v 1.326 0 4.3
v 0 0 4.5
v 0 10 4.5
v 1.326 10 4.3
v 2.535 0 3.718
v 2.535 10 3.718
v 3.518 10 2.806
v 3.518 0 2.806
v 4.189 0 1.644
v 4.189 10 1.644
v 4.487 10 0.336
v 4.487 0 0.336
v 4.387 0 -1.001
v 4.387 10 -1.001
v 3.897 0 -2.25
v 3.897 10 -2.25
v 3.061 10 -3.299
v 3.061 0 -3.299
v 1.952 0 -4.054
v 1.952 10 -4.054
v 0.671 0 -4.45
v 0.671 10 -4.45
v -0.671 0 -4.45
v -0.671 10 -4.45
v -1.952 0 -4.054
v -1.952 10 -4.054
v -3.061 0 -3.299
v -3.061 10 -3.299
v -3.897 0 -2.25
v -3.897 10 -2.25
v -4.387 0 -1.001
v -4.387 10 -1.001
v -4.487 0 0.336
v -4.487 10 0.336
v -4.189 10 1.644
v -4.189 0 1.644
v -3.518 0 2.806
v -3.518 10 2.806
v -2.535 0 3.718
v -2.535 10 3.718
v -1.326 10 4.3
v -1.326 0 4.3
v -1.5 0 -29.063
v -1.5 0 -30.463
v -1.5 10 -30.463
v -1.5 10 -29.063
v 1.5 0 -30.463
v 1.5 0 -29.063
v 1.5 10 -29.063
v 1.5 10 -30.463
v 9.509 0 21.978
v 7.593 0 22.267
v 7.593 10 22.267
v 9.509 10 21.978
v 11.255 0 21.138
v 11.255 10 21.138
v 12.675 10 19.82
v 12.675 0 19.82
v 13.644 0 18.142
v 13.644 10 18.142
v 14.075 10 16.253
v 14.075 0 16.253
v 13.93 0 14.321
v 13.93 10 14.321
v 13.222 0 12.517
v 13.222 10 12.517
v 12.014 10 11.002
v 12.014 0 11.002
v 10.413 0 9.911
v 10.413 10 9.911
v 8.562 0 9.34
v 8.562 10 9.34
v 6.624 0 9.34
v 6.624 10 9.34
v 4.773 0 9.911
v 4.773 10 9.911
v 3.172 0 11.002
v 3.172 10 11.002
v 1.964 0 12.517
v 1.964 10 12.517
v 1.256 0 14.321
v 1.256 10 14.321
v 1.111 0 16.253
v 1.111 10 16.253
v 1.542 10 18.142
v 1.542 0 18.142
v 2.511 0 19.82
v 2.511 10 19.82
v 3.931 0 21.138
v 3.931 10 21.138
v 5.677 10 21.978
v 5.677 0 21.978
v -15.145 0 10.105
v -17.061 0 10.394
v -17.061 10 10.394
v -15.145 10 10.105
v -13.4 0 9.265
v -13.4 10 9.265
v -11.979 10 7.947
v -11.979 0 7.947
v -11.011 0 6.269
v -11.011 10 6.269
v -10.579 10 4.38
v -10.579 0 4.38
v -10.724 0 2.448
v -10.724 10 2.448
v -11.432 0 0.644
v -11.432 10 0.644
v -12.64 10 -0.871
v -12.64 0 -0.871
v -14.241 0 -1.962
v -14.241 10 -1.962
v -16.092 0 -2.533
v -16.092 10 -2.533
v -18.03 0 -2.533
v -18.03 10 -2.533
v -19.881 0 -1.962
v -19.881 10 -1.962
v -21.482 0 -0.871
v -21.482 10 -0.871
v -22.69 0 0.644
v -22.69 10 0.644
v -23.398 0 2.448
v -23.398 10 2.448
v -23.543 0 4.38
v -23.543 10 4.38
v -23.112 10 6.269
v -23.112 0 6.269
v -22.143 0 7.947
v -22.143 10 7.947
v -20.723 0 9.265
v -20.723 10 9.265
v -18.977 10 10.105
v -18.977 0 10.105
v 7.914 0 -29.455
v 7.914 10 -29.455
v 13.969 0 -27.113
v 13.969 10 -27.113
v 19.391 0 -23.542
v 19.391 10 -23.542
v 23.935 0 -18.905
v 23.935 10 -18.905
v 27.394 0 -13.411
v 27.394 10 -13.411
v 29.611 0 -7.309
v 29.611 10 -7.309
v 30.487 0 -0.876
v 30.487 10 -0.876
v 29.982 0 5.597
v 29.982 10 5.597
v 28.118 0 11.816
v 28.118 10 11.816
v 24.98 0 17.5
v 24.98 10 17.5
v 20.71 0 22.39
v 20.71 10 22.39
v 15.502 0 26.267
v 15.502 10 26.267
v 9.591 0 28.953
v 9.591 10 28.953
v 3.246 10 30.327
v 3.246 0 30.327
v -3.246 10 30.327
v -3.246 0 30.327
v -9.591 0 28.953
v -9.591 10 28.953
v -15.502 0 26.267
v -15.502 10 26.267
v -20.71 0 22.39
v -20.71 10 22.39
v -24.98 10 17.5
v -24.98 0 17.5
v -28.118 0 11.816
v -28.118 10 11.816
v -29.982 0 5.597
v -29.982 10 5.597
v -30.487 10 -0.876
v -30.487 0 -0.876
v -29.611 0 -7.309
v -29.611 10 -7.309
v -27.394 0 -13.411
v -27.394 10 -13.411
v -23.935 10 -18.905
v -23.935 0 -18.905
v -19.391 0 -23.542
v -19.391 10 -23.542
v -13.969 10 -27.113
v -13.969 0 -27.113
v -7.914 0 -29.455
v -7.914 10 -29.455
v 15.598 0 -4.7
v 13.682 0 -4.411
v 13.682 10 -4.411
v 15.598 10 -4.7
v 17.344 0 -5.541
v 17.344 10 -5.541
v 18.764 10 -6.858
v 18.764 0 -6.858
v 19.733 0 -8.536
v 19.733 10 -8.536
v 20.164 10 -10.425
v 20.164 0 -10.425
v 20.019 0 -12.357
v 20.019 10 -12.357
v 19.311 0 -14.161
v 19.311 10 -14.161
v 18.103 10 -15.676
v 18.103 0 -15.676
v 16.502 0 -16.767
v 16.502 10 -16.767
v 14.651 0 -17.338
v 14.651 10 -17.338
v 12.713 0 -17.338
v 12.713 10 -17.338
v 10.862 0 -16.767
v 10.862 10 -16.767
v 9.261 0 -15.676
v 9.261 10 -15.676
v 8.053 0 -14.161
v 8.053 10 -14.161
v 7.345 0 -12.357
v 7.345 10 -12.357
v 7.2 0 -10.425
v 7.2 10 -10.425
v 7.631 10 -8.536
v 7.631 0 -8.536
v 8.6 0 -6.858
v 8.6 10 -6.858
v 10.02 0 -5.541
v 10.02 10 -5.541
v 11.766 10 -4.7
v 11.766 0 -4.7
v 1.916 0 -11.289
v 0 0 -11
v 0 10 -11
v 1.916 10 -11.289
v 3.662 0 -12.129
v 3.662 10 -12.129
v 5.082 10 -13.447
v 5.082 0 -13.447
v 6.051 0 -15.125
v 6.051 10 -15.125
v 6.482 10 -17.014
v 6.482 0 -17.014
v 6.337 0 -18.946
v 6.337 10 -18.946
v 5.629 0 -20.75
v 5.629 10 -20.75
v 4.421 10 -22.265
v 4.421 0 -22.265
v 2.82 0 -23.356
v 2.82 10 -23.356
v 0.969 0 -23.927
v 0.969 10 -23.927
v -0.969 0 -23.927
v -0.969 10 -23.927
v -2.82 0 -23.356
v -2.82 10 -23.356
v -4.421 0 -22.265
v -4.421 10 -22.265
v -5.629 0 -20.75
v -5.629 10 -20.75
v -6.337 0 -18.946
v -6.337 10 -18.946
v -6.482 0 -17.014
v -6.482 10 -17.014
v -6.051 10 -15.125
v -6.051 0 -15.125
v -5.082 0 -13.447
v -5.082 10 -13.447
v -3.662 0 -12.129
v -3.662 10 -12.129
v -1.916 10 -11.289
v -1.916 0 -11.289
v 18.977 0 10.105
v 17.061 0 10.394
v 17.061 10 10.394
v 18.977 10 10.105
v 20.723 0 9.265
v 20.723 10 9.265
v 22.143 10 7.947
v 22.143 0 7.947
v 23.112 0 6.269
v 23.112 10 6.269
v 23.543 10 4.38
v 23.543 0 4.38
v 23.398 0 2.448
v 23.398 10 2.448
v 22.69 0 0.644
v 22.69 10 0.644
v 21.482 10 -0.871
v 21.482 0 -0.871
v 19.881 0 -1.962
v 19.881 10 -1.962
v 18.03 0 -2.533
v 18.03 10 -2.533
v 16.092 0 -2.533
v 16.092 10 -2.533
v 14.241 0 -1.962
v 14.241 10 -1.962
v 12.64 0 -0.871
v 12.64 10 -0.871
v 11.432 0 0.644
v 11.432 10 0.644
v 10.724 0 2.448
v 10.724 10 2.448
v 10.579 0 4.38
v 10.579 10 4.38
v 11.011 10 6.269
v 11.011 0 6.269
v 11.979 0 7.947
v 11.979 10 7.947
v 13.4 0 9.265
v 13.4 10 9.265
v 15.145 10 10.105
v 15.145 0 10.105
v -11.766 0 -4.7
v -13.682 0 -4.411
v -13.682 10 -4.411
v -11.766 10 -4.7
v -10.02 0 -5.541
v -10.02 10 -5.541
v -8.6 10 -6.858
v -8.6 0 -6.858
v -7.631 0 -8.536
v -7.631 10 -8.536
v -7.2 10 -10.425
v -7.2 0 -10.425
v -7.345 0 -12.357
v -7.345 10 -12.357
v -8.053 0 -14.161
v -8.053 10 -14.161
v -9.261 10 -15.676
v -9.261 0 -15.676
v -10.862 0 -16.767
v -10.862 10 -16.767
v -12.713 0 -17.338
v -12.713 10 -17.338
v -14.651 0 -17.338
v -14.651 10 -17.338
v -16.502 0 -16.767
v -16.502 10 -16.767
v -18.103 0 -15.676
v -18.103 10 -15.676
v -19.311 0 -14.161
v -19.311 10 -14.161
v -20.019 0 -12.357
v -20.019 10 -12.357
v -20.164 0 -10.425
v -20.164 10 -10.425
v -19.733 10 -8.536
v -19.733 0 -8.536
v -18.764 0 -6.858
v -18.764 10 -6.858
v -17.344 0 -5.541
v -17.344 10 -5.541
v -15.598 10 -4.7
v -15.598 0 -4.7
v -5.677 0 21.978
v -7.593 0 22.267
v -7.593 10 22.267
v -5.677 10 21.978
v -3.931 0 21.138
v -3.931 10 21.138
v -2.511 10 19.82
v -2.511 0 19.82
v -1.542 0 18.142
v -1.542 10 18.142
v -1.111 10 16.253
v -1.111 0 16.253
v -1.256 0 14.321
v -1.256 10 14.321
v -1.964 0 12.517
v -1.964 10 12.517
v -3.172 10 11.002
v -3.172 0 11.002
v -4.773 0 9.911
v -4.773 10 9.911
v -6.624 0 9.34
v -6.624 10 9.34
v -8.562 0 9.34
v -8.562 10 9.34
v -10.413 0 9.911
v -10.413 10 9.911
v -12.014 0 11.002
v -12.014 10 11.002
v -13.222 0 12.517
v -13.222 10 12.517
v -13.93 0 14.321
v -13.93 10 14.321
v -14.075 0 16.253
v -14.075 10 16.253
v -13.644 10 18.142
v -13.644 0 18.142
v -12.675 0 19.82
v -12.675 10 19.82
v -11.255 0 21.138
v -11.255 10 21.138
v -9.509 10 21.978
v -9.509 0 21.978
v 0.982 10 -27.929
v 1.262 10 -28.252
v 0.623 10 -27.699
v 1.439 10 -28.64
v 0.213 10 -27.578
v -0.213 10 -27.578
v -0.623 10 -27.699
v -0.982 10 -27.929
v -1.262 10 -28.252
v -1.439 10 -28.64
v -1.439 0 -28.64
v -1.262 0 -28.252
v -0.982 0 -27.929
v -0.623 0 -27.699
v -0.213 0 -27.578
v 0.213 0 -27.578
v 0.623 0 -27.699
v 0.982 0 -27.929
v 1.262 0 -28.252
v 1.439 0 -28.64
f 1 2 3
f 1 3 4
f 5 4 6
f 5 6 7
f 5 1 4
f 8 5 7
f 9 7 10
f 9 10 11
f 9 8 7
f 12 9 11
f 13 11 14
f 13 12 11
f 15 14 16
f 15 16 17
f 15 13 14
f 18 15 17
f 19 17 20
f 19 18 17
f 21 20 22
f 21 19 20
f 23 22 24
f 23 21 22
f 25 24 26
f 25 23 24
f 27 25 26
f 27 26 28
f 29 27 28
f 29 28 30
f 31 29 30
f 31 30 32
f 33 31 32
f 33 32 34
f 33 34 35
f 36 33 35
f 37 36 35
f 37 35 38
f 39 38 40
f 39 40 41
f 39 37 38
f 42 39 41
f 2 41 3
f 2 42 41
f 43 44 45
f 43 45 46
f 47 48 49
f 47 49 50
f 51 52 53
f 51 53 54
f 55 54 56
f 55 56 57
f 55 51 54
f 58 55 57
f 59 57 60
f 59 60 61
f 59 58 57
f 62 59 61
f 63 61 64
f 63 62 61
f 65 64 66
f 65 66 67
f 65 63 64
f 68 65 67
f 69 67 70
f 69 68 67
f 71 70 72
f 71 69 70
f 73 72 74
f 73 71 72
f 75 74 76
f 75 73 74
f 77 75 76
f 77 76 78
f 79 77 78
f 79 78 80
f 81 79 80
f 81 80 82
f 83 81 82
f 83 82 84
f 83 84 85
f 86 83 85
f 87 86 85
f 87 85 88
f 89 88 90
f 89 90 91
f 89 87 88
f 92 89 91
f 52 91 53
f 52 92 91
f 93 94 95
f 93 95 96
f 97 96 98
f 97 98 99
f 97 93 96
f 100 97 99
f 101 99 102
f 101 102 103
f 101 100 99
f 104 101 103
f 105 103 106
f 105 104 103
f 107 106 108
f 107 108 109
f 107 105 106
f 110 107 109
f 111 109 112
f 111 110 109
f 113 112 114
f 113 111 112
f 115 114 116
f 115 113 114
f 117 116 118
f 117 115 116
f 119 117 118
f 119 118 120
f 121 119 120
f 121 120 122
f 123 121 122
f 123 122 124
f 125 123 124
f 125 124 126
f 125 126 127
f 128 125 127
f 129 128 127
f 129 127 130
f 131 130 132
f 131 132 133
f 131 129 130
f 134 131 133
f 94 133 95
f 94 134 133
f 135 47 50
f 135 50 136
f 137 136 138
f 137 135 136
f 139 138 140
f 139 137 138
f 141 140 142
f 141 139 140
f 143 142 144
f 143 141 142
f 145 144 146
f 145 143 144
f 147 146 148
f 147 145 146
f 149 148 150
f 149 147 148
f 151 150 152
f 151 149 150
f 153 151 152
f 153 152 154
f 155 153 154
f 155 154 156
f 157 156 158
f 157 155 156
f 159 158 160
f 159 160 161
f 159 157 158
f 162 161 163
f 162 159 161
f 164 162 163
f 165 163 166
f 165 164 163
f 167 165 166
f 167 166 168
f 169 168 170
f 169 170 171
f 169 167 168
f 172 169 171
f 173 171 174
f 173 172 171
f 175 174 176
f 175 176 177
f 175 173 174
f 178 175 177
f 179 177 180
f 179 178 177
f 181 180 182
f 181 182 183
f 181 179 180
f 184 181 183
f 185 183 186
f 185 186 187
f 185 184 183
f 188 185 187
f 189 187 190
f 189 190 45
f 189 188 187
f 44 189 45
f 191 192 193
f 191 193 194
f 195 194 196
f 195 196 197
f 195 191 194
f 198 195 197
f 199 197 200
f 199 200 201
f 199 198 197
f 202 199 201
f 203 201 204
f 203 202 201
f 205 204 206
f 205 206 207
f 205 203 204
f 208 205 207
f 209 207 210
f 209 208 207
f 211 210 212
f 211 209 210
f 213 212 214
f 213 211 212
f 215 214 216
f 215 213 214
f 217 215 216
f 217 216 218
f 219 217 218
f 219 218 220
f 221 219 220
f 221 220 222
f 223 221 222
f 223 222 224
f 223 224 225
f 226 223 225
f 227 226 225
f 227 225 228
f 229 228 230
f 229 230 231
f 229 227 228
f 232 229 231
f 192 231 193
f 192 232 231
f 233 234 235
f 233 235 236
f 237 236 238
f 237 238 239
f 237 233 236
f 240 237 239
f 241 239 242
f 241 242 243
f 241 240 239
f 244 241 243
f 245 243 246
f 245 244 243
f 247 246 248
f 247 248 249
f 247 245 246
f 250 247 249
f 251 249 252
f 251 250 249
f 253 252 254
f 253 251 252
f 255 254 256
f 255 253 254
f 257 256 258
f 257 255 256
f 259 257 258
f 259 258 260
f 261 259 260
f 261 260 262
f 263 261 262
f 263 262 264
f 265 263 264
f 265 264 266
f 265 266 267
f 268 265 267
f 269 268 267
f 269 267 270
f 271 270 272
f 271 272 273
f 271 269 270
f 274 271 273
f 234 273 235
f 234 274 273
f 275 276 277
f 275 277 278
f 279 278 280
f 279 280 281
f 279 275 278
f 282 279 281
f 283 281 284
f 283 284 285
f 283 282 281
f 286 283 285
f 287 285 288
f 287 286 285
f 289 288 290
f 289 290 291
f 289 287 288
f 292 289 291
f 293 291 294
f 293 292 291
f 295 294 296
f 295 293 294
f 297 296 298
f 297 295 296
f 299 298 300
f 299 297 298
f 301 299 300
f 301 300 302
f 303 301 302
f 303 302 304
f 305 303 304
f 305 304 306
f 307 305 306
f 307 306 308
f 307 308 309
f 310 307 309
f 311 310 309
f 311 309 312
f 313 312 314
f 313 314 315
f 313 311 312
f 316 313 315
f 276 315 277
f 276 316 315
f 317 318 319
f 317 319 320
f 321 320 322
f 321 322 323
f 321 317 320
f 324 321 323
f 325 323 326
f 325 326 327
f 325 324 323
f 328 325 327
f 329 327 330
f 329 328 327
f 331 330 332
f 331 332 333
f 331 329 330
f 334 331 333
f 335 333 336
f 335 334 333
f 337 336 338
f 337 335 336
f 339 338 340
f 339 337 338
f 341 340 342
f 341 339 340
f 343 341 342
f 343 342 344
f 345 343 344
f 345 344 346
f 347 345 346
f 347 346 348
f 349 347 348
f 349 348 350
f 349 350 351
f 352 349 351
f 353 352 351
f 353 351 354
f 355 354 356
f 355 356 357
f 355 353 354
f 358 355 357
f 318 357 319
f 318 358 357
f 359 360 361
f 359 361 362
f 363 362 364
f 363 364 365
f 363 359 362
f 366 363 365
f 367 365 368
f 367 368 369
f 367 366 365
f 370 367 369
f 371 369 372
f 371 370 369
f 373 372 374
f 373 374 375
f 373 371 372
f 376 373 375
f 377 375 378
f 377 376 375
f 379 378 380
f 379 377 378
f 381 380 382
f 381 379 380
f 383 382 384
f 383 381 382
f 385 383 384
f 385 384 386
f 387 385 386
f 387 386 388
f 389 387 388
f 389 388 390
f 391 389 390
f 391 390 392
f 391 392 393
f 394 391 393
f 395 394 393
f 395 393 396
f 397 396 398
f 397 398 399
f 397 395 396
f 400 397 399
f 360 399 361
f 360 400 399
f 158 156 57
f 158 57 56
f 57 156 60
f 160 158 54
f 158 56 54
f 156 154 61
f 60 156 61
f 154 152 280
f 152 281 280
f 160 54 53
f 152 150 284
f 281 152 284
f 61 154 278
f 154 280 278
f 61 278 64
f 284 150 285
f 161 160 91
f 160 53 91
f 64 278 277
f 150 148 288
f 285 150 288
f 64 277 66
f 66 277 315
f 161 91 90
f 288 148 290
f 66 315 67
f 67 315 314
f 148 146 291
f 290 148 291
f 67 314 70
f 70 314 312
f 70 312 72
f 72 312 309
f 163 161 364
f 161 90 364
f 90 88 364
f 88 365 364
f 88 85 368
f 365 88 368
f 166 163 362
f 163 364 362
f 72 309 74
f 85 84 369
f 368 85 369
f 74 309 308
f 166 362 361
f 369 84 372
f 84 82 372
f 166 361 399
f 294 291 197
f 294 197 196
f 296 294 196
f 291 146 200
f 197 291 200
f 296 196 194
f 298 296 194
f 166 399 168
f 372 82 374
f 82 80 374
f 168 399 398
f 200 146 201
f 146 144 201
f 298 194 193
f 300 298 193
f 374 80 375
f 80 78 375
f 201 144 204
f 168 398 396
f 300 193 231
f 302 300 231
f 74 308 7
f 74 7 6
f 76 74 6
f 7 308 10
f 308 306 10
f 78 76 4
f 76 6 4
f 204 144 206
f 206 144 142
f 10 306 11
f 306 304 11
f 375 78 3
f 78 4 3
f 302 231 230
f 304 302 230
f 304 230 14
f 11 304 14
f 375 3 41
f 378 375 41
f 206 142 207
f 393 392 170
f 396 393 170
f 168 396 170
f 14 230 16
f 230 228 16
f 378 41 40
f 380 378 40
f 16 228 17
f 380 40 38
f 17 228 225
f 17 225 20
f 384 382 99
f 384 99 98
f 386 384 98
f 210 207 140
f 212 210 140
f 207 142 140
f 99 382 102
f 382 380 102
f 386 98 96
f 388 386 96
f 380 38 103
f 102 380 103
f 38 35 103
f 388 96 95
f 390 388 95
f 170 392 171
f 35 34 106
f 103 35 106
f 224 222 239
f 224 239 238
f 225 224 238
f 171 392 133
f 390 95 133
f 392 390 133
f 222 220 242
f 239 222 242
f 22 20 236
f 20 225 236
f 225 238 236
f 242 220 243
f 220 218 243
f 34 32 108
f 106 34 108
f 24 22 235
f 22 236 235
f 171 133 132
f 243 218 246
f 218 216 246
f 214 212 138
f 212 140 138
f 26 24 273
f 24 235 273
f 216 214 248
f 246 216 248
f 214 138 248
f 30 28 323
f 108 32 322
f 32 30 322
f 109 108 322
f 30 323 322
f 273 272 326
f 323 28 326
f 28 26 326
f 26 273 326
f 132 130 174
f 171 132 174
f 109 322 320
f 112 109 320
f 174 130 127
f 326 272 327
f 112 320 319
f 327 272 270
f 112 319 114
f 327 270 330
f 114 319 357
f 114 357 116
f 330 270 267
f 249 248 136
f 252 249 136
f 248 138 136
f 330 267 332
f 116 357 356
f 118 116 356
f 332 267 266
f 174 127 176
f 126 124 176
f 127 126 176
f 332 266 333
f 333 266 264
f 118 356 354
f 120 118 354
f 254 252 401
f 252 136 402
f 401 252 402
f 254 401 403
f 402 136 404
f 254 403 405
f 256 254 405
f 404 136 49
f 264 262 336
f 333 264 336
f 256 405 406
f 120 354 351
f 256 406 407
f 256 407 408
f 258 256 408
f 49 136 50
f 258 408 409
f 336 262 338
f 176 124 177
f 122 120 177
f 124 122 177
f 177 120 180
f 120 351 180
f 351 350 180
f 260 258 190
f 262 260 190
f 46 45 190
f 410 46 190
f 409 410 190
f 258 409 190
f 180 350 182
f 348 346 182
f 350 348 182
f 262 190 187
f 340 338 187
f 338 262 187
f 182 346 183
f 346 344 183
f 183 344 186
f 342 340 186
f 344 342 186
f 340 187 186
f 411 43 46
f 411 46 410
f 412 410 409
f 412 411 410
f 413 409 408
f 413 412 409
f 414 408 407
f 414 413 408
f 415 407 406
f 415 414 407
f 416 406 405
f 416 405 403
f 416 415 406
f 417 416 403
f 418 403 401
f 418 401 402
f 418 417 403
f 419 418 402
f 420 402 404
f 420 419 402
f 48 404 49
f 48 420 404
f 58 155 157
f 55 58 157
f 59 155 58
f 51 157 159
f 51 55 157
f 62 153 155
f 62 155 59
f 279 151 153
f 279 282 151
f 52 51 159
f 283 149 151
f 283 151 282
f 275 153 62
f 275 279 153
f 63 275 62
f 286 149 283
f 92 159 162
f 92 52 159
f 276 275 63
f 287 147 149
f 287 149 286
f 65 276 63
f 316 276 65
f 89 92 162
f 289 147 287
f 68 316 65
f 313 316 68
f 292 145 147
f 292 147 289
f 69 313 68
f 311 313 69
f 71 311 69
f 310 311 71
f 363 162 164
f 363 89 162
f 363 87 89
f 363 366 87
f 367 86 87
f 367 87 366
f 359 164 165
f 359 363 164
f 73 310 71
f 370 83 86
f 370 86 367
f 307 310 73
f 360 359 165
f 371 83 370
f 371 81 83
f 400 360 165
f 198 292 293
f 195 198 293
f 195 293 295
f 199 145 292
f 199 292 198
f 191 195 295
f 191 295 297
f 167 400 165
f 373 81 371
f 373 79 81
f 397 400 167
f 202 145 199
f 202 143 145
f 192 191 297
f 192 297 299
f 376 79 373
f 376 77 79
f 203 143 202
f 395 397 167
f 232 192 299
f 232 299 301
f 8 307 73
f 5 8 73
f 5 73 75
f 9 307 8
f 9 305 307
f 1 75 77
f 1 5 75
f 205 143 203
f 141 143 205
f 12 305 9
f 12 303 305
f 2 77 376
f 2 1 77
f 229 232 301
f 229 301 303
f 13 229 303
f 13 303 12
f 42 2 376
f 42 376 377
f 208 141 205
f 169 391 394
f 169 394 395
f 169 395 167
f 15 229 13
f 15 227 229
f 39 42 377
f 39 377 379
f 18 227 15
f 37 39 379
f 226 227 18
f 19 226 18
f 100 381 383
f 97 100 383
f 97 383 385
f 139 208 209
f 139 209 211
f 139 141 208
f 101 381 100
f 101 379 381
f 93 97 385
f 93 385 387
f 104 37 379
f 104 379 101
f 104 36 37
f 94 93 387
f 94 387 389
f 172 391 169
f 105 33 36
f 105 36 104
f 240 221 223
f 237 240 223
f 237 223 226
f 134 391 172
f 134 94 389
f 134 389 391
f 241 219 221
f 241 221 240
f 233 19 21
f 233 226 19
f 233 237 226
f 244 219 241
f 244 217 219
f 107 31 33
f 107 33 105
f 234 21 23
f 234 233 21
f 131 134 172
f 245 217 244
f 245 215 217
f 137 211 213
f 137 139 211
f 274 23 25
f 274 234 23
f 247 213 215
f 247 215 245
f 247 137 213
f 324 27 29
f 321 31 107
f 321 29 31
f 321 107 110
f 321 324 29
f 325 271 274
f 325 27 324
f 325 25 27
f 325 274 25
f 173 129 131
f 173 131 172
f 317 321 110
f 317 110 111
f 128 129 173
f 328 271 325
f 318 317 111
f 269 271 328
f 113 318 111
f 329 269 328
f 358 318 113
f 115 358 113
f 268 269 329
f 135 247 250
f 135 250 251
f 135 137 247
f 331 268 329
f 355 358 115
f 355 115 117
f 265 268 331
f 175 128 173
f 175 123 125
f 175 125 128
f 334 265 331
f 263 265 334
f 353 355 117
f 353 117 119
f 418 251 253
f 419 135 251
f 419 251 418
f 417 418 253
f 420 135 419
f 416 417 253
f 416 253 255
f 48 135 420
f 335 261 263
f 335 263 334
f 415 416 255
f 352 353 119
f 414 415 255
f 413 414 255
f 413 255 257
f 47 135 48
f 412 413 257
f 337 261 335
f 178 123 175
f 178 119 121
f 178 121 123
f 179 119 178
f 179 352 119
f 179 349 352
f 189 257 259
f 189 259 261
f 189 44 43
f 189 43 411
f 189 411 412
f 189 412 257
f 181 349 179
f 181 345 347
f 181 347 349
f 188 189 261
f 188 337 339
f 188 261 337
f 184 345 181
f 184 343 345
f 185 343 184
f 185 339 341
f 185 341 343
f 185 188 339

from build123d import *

# Parameters (mm, degrees)
SZKIC1_R                    = 4.5
SZKIC1_R_2                  = 6.5
DODANIE_WYCI_GNI_CIE1_DEPTH = 10


with BuildPart() as part:
    # Szkic1 → Dodanie-wyciągnięcie1 (new body)
    with BuildSketch(Plane(origin=(0, 0, 0), x_dir=(1, 0, 0), z_dir=(0, 1, 0))):
        with BuildLine():
            Line((-1.5, 30.463092423), (-1.5, 29.063092423))
            ThreePointArc((-1.5, 29.063092423), (0, 27.563092423), (1.5, 29.063092423))
            Line((1.5, 29.063092423), (1.5, 30.463092423))
            ThreePointArc((1.5, 30.463092423), (0, -30.5), (-1.5, 30.463092423))
        make_face()
        with Locations(Location((0, 0, 0), (0, 0, 270))):
            Circle(SZKIC1_R, mode=Mode.SUBTRACT)
        with Locations(Location((0, 17.5, 0), (0, 0, 270))):
            Circle(SZKIC1_R_2, mode=Mode.SUBTRACT)
        with Locations(Location((13.682050943, 10.911071533, 0), (0, 0, 270))):
            Circle(SZKIC1_R_2, mode=Mode.SUBTRACT)
        with Locations(Location((17.061238463, -3.894116344, 0), (0, 0, 270))):
            Circle(SZKIC1_R_2, mode=Mode.SUBTRACT)
        with Locations(Location((7.592965435, -15.766955188, 0), (0, 0, 270))):
            Circle(SZKIC1_R_2, mode=Mode.SUBTRACT)
        with Locations(Location((-7.592965435, -15.766955188, 0), (0, 0, 270))):
            Circle(SZKIC1_R_2, mode=Mode.SUBTRACT)
        with Locations(Location((-17.061238463, -3.894116344, 0), (0, 0, 270))):
            Circle(SZKIC1_R_2, mode=Mode.SUBTRACT)
        with Locations(Location((-13.682050943, 10.911071533, 0), (0, 0, 270))):
            Circle(SZKIC1_R_2, mode=Mode.SUBTRACT)
    extrude(amount=DODANIE_WYCI_GNI_CIE1_DEPTH)


solid = part.part
